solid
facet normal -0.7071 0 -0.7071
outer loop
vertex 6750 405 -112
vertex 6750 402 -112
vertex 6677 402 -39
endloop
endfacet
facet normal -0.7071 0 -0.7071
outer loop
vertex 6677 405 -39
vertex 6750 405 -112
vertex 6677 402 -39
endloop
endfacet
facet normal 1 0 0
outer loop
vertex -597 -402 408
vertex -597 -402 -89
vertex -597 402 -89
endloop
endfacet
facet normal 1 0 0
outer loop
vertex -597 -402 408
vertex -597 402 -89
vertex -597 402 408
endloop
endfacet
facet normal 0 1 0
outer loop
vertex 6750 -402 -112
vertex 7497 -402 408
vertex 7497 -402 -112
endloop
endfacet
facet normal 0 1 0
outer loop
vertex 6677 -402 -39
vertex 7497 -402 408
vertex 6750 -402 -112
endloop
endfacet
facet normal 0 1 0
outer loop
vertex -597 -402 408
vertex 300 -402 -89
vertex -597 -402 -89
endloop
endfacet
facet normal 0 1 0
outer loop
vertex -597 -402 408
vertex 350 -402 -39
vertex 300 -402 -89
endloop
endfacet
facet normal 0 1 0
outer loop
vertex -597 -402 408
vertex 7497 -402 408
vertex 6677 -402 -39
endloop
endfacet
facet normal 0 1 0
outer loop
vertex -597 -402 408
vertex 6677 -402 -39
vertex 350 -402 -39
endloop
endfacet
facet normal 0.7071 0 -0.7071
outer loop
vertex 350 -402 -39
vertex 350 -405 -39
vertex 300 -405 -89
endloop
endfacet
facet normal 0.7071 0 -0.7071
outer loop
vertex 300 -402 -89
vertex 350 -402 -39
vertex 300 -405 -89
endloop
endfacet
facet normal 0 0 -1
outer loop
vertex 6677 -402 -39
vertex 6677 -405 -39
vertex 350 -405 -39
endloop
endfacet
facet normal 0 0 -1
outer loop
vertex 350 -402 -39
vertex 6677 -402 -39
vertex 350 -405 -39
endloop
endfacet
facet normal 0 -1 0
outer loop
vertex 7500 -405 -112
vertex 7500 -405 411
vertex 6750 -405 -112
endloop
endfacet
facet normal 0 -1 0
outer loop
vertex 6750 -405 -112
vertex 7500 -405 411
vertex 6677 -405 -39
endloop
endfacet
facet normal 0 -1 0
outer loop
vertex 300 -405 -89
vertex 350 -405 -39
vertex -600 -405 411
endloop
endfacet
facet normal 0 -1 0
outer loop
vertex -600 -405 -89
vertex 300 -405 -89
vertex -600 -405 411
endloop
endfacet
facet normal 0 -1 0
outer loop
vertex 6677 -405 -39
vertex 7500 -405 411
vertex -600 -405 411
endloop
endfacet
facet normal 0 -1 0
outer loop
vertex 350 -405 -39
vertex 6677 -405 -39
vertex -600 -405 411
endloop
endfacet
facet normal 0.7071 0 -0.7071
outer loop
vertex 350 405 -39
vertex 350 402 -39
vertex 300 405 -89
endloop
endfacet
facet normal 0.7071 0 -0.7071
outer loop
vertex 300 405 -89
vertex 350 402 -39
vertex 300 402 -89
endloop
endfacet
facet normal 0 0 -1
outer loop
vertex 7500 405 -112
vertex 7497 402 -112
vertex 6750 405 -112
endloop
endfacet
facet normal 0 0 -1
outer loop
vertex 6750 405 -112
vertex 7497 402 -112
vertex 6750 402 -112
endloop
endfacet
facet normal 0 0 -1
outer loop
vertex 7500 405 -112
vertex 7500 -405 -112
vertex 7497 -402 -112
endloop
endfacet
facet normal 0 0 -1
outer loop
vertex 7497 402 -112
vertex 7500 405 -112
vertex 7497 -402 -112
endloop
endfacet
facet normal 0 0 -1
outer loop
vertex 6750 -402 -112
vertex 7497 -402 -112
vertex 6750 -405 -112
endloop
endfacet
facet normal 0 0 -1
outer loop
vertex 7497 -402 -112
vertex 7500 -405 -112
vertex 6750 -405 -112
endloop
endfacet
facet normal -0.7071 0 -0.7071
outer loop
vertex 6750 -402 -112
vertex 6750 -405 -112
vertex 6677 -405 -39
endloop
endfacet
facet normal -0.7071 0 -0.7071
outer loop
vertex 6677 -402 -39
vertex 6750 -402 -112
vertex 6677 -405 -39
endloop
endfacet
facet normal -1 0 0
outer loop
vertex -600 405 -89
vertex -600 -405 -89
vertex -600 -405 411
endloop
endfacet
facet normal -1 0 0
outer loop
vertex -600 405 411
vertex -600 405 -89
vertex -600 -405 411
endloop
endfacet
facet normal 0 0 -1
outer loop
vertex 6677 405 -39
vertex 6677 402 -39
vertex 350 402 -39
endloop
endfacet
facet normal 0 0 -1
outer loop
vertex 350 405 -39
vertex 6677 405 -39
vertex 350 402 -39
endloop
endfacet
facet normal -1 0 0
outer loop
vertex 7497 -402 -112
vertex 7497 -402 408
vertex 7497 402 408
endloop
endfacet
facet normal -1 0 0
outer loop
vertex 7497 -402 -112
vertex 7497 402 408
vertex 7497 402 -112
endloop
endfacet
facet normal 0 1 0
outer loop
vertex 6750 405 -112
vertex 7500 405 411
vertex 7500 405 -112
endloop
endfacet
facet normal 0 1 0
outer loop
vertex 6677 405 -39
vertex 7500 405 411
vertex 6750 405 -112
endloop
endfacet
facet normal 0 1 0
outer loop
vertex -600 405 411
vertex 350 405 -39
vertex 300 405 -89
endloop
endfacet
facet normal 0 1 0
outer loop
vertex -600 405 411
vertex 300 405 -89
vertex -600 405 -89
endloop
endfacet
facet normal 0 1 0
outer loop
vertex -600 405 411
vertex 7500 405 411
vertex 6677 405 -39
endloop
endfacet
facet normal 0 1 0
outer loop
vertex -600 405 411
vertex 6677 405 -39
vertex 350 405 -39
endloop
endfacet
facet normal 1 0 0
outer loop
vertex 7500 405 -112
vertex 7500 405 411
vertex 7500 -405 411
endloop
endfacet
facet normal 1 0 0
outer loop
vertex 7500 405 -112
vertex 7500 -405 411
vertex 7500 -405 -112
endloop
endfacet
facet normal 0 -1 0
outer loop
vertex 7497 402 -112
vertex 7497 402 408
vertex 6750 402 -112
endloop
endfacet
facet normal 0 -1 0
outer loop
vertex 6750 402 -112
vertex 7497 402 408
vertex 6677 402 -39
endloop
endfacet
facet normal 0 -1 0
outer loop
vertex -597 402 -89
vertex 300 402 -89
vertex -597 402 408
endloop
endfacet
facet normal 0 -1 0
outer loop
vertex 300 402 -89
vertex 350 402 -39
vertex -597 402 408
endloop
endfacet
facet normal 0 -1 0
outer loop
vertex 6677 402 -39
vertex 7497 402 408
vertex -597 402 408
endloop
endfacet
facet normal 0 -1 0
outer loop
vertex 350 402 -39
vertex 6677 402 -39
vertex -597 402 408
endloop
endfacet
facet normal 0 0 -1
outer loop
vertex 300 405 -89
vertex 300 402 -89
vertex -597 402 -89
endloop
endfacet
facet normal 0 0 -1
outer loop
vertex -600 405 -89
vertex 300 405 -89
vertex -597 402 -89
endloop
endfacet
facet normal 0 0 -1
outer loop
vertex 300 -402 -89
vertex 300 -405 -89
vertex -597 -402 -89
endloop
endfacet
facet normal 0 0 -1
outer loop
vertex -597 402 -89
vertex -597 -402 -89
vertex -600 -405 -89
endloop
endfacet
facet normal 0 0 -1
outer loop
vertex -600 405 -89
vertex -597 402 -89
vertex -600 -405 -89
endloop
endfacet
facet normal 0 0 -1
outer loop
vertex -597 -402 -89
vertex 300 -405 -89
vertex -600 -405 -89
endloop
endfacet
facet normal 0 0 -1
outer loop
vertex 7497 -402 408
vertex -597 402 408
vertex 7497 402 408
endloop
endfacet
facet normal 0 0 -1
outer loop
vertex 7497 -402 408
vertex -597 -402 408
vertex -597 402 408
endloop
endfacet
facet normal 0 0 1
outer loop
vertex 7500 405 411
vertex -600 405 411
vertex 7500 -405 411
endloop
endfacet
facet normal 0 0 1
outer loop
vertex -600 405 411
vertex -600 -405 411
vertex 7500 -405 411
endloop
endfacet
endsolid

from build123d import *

# Parameters (mm, degrees)
EXTRUDE033_DEPTH = 402
EXTRUDE012_DEPTH = 405


with BuildPart() as extrude033:
    # Sketch034 → Extrude033 (new body, symmetric)
    with BuildSketch(Plane.XZ):
        Polygon((-597, -89), (-597, 411), (7497, 411), (7497, -112), (6747, -112), (6674, -39), (350, -39), (300, -89), align=None)
    extrude(amount=EXTRUDE033_DEPTH, both=True)


with BuildPart() as extrude033_1:
    # Extrude033 placement: moved
    add(extrude033.part.moved(Location((0, 0, -3))))


with BuildPart() as cut003:
    # Sketch020 → Extrude012 (new body, symmetric)
    with BuildSketch(Plane.XZ):
        Polygon((-600, -89), (-600, 411), (7500, 411), (7500, -112), (6750, -112), (6677, -39), (350, -39), (300, -89), align=None)
    extrude(amount=EXTRUDE012_DEPTH, both=True)

    # Cut003: cut Extrude033
    add(extrude033_1.part, mode=Mode.SUBTRACT)


solid = cut003.part
